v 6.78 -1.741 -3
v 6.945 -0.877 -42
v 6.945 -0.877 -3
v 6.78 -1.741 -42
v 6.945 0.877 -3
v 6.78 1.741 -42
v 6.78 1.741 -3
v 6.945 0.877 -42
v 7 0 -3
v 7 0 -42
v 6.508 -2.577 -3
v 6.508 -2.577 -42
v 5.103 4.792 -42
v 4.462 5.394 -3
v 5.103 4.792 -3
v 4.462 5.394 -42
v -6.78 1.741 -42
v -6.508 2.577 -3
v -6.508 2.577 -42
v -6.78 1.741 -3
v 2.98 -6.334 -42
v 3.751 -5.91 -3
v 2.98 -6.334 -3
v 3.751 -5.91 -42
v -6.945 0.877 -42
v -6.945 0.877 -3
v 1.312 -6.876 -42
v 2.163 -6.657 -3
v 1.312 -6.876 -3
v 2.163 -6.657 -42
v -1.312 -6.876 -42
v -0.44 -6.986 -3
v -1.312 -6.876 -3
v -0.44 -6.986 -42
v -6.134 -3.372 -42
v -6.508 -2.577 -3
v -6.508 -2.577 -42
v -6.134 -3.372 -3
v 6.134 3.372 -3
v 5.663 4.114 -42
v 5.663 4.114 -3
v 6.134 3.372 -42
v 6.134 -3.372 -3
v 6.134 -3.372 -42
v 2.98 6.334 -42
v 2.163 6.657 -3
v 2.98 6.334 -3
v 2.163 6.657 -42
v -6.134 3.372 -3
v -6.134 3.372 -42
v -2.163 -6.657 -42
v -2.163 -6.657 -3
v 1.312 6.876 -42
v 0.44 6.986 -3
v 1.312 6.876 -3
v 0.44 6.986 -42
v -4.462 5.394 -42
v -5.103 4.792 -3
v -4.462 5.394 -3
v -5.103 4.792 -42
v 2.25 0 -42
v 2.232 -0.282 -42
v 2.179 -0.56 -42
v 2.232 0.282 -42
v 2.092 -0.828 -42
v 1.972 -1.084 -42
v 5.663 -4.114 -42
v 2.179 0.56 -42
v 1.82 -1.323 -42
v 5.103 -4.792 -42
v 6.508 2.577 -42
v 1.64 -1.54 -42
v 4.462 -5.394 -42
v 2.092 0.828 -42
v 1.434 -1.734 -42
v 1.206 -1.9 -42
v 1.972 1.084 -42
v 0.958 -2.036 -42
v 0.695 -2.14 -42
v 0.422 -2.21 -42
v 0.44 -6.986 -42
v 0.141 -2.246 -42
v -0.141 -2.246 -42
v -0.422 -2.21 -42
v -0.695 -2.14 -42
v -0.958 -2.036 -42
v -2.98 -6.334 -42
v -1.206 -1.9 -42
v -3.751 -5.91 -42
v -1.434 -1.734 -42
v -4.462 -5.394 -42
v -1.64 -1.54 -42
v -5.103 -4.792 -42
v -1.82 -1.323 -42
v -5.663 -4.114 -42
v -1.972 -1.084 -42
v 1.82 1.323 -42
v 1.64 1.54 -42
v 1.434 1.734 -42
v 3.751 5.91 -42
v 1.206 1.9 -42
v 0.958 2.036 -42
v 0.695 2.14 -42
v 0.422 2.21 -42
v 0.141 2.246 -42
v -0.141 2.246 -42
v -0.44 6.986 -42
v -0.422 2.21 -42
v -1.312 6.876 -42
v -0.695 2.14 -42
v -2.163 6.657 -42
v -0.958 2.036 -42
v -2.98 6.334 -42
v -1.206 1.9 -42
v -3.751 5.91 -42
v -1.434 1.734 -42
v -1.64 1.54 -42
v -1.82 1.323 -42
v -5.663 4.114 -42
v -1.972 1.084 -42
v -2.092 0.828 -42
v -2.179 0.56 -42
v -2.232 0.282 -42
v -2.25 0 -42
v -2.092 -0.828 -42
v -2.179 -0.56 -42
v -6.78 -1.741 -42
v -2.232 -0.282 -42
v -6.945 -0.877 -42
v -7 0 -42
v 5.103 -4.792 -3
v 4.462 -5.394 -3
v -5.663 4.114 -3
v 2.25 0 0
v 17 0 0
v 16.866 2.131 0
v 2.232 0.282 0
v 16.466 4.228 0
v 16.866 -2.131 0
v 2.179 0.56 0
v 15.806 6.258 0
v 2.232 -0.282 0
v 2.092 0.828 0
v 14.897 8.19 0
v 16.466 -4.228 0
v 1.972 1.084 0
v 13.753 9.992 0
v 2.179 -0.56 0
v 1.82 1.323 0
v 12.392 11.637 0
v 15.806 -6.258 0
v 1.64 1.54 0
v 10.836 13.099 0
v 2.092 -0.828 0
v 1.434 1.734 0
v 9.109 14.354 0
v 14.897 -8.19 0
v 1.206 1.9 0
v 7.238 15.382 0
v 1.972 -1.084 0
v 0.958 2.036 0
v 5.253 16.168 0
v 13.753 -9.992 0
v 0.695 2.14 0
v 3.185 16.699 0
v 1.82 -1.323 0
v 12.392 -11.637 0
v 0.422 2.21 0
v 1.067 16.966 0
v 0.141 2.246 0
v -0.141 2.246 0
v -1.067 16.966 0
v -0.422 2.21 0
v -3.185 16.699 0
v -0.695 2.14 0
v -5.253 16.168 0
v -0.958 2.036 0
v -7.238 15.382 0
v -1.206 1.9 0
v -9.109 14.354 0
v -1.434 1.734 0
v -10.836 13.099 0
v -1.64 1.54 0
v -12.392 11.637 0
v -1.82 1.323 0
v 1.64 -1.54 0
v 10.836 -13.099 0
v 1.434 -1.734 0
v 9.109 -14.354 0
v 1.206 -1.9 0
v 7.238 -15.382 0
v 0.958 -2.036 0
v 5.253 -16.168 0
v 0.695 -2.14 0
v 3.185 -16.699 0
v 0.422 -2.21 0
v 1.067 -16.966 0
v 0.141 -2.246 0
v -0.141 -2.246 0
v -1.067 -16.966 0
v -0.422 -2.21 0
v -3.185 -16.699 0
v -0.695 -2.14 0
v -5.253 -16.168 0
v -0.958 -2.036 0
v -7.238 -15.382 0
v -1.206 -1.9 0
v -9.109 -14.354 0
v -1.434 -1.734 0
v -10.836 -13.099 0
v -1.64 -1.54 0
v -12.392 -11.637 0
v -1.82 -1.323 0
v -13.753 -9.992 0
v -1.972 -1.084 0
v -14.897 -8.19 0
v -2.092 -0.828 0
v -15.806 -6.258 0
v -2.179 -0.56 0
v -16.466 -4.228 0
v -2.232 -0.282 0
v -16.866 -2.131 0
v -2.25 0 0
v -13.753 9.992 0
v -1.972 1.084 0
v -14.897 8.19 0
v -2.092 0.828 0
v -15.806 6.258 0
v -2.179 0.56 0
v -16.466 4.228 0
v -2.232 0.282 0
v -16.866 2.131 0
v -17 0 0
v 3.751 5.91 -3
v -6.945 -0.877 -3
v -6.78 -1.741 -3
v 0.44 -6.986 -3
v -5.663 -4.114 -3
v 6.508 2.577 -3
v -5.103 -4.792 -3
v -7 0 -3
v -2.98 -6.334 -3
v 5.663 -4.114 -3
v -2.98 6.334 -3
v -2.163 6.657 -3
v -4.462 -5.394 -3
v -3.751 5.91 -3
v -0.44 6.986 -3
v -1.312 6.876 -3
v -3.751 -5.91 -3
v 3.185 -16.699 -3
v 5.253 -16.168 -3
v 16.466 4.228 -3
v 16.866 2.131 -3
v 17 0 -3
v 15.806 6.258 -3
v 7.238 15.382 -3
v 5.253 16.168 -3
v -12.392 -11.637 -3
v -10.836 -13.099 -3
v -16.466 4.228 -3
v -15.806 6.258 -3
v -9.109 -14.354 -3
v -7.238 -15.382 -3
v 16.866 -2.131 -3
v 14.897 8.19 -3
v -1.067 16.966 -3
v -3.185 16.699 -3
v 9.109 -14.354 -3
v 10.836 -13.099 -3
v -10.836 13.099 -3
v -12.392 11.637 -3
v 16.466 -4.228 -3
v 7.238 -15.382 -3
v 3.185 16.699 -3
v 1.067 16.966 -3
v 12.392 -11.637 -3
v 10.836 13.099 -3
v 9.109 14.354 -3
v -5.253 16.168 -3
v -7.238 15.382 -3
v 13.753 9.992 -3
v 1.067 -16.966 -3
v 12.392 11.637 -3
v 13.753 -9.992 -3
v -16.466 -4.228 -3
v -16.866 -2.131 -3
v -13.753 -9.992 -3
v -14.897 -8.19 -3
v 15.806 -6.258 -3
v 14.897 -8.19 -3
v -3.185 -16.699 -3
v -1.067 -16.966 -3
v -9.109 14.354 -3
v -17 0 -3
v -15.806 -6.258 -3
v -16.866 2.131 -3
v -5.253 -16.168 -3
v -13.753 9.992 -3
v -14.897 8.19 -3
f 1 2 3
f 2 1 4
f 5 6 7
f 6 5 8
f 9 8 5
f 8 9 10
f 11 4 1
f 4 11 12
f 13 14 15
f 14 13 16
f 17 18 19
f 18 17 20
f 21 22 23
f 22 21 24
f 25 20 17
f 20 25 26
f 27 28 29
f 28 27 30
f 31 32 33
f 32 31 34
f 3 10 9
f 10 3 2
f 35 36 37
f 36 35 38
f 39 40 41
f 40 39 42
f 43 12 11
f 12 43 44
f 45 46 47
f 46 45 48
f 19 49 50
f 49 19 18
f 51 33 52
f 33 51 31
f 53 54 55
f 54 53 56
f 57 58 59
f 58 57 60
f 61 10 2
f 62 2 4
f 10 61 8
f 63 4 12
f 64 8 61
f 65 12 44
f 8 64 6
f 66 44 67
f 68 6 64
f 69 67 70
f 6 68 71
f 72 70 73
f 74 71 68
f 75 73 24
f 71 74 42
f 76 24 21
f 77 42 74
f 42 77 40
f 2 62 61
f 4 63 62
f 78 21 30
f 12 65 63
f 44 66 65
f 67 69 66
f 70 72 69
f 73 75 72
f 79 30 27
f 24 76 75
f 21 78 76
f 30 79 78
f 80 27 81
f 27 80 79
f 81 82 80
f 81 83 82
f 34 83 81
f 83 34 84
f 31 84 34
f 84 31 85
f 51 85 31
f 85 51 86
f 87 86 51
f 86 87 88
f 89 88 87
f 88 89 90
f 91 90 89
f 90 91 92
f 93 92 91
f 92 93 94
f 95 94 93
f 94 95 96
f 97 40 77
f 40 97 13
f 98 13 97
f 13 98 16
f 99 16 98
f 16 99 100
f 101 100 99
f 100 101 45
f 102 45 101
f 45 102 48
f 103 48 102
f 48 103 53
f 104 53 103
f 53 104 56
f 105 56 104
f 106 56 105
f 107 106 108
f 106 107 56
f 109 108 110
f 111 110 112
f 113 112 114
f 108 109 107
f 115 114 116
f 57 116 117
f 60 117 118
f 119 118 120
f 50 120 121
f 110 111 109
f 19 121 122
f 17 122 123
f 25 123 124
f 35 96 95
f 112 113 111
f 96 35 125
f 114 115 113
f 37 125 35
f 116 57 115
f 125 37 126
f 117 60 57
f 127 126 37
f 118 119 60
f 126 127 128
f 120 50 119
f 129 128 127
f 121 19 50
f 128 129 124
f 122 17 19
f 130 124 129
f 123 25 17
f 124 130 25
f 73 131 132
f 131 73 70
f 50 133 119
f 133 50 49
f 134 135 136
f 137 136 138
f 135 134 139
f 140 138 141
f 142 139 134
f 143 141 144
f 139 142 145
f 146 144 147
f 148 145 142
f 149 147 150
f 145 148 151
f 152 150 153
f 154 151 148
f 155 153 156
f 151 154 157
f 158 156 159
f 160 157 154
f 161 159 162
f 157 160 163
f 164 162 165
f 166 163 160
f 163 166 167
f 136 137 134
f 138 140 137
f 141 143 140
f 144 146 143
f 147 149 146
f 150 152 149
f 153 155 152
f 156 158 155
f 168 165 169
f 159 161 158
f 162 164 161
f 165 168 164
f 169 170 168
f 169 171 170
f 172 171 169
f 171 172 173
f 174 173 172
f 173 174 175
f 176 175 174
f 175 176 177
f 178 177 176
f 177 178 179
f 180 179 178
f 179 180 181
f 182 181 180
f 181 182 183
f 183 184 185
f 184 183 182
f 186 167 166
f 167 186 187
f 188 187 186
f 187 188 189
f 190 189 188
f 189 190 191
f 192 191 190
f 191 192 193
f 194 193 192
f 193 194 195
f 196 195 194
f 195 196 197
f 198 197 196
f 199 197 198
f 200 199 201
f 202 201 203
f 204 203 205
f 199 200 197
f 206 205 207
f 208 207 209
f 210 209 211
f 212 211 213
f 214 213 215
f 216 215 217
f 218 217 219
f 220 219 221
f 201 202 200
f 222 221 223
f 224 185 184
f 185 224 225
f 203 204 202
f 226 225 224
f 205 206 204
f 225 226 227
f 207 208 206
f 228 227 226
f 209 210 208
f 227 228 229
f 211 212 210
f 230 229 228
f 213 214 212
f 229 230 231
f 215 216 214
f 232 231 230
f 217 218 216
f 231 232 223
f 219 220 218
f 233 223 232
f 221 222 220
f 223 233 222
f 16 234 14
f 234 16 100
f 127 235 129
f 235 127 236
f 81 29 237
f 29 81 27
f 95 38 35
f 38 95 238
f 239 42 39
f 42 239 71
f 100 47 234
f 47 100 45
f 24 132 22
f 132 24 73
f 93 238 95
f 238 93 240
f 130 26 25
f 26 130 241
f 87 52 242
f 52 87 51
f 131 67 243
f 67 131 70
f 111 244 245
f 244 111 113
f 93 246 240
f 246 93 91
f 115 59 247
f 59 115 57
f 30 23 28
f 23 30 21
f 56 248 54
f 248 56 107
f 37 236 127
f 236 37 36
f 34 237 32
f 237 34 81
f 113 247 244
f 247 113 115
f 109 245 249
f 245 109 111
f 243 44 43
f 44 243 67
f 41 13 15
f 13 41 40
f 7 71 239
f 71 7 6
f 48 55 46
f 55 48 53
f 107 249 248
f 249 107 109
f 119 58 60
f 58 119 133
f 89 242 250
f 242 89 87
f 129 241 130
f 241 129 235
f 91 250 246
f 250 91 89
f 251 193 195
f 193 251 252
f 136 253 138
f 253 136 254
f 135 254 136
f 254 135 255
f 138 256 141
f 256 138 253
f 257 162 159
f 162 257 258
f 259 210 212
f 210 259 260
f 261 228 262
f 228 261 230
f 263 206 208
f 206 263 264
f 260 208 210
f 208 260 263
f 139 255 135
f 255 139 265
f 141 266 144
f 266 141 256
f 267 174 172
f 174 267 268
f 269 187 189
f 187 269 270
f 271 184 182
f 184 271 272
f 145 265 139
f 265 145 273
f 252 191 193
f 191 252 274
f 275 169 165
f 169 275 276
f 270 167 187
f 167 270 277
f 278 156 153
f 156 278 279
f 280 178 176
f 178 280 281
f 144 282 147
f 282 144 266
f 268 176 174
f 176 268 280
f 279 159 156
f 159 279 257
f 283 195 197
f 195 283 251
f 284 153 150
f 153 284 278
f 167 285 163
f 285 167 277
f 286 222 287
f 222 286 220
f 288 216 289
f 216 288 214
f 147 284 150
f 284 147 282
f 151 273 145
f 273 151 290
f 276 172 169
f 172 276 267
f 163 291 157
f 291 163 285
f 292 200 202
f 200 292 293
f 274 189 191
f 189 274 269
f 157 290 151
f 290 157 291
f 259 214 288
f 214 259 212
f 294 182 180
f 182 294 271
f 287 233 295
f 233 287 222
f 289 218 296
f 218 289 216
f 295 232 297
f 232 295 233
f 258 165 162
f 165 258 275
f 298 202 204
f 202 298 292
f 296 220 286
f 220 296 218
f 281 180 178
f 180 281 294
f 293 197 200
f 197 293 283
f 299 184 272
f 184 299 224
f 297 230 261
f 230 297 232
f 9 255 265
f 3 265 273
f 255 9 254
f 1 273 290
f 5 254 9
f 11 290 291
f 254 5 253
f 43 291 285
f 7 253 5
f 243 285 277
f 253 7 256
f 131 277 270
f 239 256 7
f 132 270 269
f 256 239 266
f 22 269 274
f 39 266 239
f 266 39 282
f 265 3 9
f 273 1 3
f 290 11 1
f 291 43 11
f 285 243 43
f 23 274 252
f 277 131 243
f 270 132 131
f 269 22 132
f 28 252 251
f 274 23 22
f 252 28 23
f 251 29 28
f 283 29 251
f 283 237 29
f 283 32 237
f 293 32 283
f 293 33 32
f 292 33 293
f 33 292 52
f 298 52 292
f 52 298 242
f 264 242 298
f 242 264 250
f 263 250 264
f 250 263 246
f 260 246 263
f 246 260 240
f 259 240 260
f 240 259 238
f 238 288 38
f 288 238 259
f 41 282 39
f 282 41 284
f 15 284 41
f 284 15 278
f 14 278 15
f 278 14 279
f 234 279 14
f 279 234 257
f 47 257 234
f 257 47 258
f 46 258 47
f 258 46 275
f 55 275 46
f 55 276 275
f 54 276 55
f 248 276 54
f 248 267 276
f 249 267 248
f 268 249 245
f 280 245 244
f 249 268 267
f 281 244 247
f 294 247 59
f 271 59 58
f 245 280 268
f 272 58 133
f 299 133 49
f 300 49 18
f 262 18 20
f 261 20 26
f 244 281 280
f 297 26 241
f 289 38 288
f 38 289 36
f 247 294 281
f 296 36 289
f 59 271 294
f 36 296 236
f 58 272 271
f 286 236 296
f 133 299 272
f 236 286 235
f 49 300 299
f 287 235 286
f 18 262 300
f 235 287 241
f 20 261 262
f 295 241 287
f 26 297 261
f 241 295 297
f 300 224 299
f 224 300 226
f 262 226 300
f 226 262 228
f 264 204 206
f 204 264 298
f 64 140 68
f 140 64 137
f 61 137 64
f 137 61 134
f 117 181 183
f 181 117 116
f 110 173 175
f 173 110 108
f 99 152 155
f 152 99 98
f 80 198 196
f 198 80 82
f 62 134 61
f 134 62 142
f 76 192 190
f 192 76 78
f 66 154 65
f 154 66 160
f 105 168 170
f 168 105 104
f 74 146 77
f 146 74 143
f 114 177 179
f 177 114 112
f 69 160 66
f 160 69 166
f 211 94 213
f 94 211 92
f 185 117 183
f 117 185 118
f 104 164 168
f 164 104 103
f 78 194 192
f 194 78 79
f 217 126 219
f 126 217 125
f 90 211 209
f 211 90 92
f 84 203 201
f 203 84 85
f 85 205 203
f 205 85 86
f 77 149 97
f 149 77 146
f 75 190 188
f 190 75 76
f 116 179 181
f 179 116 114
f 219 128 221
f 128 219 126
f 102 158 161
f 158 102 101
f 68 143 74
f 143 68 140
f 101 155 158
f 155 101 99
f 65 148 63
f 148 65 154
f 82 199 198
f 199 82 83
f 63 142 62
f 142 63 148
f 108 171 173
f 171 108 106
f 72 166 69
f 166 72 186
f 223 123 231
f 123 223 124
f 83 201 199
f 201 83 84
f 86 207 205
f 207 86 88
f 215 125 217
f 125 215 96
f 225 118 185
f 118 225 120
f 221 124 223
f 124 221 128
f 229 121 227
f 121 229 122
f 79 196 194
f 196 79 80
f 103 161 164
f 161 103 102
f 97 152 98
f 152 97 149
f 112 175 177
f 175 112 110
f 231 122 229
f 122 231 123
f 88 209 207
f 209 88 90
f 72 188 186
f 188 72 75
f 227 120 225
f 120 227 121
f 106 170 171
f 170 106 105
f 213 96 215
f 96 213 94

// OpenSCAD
$fn = 50;


difference() {
	union() {
		translate(v = [0, 0, -42.0000000000]) {
			cylinder(h = 42, r = 7.0000000000);
		}
		translate(v = [0, 0, -3.0000000000]) {
			cylinder(h = 3, r = 17.0000000000);
		}
	}
	union() {
		#translate(v = [0, 0, -42]) {
			cylinder(h = 42, r = 2.2500000000);
		}
	}
}
